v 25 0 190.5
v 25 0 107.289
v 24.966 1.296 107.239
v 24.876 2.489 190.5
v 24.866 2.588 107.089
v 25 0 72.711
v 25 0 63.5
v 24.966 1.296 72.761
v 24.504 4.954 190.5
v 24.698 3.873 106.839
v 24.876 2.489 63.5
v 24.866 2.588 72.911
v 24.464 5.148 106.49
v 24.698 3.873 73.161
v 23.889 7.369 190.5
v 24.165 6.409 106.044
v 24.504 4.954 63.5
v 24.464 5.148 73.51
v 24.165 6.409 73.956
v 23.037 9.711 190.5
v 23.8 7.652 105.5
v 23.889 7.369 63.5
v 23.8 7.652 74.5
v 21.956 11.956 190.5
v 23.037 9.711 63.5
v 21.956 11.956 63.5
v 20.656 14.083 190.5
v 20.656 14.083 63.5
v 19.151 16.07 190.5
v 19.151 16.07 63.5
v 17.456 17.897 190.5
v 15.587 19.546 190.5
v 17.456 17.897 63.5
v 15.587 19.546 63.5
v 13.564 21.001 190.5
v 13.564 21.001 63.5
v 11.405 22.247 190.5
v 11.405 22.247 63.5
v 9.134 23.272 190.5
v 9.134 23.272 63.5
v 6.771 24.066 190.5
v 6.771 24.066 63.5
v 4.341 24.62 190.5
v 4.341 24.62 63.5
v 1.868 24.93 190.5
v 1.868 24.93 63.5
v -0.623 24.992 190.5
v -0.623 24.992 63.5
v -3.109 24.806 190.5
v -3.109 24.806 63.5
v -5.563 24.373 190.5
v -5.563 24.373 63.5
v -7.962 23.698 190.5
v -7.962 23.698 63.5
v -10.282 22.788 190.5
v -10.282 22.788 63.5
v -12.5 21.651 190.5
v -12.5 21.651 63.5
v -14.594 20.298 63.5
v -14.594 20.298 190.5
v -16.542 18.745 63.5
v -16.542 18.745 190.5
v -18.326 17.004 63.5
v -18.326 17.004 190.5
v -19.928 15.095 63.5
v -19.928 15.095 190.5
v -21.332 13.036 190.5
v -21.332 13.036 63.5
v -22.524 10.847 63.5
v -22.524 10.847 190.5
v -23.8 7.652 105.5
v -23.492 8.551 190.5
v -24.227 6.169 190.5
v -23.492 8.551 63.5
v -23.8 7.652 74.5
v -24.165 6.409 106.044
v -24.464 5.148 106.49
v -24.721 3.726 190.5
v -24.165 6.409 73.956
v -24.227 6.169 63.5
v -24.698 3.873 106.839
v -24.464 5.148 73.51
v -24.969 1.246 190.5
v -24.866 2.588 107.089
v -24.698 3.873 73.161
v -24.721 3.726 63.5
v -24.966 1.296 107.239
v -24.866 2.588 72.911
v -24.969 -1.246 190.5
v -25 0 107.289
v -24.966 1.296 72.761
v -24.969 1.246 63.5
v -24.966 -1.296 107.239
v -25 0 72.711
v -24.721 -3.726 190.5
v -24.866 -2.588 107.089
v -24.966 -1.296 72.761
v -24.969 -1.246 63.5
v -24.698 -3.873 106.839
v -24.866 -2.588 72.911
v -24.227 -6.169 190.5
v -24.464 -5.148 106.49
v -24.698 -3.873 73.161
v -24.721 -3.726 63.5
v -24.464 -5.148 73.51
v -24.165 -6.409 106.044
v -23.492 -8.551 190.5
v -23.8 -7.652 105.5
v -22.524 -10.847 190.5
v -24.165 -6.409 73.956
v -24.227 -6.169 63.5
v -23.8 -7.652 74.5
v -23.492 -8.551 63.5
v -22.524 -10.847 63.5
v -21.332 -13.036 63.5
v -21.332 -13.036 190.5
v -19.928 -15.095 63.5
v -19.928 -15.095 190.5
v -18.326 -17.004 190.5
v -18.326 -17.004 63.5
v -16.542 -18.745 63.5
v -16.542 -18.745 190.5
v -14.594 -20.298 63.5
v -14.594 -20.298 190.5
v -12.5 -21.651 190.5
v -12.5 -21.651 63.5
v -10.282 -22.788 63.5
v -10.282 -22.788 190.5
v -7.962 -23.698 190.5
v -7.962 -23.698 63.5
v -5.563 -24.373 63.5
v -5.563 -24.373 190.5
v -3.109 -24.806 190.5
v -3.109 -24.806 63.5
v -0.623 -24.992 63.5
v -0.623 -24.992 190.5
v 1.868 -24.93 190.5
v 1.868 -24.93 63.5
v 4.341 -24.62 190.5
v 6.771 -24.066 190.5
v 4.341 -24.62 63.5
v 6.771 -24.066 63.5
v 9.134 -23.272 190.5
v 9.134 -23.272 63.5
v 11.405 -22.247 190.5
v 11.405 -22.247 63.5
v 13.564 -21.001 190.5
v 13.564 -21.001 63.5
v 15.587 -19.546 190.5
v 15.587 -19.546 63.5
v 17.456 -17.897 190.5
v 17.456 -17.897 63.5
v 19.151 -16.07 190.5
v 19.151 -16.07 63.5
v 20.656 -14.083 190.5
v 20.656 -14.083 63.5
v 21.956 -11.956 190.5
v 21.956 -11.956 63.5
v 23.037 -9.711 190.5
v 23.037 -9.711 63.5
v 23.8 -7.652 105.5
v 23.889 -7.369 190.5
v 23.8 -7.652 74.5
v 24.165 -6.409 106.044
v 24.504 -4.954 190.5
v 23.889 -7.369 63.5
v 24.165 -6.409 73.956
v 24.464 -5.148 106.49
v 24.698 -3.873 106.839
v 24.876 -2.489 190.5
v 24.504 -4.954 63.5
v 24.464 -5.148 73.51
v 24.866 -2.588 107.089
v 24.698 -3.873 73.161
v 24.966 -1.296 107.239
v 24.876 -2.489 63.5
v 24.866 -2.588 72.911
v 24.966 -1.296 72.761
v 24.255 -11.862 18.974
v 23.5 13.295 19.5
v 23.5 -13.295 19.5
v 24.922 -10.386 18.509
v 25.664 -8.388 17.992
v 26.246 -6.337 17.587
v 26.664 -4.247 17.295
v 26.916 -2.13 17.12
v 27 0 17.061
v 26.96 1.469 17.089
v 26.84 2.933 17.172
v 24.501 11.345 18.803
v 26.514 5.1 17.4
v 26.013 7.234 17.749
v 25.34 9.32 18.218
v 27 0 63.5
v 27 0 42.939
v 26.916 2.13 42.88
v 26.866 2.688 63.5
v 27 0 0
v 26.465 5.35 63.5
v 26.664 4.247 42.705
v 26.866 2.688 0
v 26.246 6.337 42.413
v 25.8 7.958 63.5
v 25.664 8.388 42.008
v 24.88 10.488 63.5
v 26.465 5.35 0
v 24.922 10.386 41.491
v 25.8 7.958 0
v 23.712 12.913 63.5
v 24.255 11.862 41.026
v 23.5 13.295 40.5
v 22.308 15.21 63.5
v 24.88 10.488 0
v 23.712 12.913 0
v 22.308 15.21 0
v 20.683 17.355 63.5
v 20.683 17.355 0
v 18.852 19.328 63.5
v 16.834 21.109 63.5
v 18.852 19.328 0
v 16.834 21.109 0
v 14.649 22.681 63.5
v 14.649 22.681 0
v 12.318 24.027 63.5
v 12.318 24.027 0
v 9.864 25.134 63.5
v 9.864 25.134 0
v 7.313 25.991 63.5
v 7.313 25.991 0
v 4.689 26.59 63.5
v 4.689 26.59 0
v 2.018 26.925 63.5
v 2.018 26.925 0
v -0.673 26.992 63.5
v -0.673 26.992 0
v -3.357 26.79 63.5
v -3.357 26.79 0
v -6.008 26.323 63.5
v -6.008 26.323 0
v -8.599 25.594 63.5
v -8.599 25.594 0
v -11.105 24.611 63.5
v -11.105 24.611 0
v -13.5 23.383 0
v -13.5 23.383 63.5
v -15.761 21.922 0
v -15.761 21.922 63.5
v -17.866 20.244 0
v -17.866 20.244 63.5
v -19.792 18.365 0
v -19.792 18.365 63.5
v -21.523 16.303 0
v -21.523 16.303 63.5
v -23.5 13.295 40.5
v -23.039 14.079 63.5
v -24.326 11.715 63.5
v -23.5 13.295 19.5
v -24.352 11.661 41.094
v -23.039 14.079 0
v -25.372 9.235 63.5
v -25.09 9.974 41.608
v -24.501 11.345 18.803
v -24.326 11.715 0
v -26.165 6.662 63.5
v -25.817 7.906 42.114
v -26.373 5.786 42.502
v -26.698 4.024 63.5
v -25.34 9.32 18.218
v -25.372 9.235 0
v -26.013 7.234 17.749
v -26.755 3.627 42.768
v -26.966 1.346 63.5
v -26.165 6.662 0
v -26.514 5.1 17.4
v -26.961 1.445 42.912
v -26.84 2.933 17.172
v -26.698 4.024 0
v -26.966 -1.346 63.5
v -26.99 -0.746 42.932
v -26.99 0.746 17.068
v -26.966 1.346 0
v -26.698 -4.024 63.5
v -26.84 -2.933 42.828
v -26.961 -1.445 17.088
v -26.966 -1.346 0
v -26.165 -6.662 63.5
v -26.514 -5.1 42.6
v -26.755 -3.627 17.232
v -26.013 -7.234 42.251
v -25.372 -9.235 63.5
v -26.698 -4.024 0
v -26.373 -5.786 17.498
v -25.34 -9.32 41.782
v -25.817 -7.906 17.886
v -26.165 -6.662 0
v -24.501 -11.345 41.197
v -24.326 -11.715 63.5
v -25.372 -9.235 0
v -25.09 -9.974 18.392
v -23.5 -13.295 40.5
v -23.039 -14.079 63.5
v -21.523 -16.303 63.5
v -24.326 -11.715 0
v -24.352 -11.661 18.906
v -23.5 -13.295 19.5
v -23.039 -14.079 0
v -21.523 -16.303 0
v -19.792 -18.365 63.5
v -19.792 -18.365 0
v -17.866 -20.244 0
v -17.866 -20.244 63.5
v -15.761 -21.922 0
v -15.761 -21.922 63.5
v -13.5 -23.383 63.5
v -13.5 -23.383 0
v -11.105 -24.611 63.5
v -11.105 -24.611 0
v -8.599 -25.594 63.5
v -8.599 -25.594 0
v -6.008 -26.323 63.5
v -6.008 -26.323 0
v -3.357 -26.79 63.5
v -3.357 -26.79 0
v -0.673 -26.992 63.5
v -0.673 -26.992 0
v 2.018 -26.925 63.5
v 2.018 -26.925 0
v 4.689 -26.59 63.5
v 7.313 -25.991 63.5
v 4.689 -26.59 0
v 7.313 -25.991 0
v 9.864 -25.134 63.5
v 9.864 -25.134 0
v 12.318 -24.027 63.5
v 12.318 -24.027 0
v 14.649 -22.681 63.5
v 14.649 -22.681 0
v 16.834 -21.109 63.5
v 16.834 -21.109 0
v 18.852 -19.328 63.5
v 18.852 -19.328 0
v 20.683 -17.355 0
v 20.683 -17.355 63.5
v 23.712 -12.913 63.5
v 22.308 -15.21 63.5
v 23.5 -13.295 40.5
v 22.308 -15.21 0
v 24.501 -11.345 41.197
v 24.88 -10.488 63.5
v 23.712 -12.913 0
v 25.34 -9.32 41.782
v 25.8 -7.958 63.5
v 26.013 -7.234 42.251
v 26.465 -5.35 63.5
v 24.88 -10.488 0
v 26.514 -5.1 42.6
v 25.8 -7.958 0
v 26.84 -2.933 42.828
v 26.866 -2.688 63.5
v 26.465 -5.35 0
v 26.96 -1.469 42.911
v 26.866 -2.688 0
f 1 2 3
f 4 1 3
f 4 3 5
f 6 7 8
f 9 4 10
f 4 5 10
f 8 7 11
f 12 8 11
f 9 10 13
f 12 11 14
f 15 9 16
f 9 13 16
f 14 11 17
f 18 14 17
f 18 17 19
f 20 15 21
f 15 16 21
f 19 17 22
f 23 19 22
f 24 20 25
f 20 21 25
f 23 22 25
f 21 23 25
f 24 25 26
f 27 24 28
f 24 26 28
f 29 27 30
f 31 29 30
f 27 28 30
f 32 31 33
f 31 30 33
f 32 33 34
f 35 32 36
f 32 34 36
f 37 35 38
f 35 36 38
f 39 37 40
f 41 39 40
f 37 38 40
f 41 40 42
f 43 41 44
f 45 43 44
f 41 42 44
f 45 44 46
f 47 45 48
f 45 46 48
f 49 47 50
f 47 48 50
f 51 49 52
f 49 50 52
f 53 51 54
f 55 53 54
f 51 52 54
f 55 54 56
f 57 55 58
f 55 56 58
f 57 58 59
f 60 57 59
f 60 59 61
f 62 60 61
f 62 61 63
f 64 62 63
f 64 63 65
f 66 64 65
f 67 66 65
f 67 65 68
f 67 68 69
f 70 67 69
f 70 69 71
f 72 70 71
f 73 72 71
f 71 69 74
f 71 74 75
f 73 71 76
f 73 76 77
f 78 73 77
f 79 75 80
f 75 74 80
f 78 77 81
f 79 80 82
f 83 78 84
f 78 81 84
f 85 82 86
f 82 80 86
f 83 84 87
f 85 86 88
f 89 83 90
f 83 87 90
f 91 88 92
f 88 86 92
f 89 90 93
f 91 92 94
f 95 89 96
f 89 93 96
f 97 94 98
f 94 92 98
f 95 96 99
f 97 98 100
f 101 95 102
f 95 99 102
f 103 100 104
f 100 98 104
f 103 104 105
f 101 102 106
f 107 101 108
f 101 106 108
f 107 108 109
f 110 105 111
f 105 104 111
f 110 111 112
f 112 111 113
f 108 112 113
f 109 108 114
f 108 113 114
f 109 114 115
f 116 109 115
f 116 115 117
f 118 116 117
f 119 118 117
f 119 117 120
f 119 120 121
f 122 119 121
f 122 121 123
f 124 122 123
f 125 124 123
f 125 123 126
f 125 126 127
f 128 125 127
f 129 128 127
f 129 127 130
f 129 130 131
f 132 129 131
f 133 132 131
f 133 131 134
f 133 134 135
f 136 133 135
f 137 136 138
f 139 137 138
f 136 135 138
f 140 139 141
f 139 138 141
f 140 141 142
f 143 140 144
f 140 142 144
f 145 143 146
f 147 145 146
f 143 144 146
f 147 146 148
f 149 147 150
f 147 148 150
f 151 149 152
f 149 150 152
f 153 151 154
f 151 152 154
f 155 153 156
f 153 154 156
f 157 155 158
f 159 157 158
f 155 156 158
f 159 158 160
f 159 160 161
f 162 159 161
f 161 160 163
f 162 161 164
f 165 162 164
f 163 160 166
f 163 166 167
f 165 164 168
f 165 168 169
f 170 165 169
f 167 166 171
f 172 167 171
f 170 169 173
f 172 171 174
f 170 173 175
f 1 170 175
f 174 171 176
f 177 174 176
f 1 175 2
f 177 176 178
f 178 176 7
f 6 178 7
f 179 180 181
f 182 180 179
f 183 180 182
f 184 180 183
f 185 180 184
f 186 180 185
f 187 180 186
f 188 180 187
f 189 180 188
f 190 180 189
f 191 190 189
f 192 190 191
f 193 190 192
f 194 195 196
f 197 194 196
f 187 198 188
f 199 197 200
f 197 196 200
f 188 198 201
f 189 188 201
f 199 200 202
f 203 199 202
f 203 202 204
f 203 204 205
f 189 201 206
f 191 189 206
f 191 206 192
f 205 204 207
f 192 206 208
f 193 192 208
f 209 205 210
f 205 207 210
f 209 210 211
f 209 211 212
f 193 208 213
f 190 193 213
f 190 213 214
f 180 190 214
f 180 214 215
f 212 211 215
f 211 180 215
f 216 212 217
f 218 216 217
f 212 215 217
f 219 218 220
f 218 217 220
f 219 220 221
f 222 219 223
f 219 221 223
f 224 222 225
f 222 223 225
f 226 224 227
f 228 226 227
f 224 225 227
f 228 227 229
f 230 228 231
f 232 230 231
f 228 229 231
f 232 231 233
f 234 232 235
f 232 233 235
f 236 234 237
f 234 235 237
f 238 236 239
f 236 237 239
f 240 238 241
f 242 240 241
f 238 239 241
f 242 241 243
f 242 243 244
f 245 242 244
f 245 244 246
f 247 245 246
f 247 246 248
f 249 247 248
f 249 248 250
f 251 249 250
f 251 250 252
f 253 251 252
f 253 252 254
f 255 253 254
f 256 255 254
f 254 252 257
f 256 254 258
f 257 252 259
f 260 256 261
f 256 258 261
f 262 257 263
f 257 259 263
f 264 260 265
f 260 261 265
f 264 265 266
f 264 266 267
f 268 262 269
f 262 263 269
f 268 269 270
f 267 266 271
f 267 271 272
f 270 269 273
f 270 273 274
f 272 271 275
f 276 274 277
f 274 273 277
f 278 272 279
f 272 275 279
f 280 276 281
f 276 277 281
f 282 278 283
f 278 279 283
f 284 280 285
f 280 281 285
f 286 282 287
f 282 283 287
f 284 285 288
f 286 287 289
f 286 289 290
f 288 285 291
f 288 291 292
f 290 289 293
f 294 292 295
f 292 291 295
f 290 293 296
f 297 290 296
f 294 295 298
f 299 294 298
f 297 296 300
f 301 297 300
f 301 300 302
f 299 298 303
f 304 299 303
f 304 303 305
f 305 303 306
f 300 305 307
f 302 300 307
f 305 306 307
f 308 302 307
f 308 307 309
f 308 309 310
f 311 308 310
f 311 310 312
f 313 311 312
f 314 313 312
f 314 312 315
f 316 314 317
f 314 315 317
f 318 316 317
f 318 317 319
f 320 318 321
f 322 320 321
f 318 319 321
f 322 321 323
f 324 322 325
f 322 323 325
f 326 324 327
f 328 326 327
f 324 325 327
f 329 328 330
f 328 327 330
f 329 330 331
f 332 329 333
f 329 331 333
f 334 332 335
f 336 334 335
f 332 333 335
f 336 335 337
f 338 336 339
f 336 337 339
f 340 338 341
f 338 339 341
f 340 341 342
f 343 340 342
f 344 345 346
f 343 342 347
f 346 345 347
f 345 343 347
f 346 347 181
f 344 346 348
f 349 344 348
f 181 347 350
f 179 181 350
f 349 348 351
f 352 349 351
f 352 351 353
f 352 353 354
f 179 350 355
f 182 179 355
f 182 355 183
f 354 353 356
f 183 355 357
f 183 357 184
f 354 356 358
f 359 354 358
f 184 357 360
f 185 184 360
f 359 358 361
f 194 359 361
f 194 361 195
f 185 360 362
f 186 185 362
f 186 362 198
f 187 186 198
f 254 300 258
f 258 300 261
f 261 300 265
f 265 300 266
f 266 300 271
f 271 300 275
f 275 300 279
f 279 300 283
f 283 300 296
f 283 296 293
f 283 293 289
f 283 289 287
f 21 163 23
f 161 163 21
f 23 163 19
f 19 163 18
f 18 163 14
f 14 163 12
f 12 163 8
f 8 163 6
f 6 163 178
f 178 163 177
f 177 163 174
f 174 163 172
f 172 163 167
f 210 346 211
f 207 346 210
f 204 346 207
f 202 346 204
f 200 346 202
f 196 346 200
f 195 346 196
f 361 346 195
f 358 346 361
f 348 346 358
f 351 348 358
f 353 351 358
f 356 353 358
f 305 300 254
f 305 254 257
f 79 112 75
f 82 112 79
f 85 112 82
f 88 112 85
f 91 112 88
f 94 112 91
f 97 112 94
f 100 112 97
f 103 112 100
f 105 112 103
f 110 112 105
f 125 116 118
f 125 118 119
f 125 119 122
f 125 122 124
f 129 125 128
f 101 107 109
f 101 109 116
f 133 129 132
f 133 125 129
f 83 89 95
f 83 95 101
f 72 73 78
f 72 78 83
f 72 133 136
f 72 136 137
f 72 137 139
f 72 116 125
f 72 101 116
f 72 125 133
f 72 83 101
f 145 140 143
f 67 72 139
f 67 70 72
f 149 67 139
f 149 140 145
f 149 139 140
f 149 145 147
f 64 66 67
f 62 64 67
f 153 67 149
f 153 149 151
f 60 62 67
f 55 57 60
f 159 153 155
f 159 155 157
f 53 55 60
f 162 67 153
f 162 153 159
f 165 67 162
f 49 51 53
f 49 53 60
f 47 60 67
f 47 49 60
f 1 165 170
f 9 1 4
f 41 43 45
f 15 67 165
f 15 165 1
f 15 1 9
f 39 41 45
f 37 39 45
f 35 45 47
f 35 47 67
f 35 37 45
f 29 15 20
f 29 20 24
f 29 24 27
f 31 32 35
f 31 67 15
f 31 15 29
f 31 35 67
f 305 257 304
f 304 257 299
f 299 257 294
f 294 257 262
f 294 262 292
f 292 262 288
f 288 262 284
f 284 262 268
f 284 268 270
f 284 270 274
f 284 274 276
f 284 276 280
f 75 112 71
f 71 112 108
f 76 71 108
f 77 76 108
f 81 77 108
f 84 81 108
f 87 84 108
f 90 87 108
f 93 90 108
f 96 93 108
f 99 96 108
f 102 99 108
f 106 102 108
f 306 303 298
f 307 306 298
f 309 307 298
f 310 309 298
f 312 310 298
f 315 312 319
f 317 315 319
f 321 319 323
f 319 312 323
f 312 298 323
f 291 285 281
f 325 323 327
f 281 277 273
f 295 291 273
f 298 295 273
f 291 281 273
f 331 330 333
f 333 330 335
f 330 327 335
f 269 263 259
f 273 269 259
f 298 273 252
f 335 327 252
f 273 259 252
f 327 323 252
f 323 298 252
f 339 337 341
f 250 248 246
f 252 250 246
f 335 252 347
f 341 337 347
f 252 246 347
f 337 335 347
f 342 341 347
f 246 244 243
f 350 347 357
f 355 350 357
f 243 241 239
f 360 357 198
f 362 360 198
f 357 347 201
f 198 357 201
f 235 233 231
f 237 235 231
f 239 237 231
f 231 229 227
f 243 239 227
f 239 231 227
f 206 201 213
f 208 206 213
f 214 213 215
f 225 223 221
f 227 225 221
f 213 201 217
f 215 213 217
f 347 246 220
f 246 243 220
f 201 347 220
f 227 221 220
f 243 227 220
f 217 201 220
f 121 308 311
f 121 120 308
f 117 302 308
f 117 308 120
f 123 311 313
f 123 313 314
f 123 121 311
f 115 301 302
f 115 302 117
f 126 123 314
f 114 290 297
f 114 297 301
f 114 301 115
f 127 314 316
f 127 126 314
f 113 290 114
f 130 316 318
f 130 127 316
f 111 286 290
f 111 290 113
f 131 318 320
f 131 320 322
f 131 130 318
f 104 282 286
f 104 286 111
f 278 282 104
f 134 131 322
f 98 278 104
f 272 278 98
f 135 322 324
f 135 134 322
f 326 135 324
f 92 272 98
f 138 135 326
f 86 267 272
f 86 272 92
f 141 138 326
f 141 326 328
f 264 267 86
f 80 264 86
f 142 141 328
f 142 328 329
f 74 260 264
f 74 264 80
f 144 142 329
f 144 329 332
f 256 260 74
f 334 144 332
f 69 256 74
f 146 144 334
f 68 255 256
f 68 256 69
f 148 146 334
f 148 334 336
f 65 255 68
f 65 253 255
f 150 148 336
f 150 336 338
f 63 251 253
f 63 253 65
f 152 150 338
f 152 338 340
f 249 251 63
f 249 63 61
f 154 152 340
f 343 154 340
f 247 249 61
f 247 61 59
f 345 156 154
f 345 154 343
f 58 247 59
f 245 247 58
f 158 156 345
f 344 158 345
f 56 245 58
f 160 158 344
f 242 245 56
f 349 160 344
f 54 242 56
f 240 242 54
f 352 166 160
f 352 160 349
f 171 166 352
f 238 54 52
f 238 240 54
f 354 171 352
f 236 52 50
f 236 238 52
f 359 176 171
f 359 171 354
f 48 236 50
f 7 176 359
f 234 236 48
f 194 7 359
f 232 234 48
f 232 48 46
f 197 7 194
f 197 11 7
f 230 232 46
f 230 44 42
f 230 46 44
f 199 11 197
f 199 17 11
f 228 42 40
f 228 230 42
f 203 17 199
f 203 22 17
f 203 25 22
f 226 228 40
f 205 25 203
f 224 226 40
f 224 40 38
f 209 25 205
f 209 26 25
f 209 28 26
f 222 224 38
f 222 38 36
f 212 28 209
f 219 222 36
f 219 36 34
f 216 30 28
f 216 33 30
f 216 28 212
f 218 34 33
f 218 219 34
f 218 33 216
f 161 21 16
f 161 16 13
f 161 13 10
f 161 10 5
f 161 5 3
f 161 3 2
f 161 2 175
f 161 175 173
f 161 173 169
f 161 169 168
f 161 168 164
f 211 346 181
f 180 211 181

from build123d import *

# Parameters (mm, degrees)
SKETCH1_R               = 27
BOSS_EXTRUDE1_DEPTH     = 63.5
SKETCH2_R               = 25
BOSS_EXTRUDE2_DEPTH     = 127
CUT_EXTRUDE1_DEPTH      = 195.289088731
CUT_EXTRUDE1_DEPTH_BACK = 195.289088731


with BuildPart() as part:
    # Sketch1 → Boss-Extrude1 (new body)
    with BuildSketch(Plane.XY):
        Circle(SKETCH1_R)
    extrude(amount=BOSS_EXTRUDE1_DEPTH)

    # Sketch2 → Boss-Extrude2 (add)
    with BuildSketch(Plane.XY.offset(63.5)):
        Circle(SKETCH2_R)
    extrude(amount=BOSS_EXTRUDE2_DEPTH)

    # Sketch4 → Cut-Extrude1 (cut, two sides: drawn at the far end of the back side and taken through both)
    with BuildSketch(Plane(origin=(0, 0, 0), x_dir=(1, 0, 0), z_dir=(0, 1, 0)).offset(-CUT_EXTRUDE1_DEPTH_BACK)):
        Polygon((-25, -72.711167147), (-23.8, -74.5), (-23.8, -105.5), (-25, -107.288832853), align=None)
        Polygon((-27.757940887, -16.532917761), (-27.757940887, -43.467082239), (-23.5, -40.5), (-23.5, -19.5), align=None)
        Polygon((23.8, -74.5), (23.8, -105.5), (25, -107.288832853), (25, -72.711167147), align=None)
        Polygon((27.757940887, -16.532917761), (27.757940887, -43.467082239), (23.5, -40.5), (23.5, -19.5), align=None)
    extrude(amount=CUT_EXTRUDE1_DEPTH + CUT_EXTRUDE1_DEPTH_BACK, mode=Mode.SUBTRACT)


solid = part.part
